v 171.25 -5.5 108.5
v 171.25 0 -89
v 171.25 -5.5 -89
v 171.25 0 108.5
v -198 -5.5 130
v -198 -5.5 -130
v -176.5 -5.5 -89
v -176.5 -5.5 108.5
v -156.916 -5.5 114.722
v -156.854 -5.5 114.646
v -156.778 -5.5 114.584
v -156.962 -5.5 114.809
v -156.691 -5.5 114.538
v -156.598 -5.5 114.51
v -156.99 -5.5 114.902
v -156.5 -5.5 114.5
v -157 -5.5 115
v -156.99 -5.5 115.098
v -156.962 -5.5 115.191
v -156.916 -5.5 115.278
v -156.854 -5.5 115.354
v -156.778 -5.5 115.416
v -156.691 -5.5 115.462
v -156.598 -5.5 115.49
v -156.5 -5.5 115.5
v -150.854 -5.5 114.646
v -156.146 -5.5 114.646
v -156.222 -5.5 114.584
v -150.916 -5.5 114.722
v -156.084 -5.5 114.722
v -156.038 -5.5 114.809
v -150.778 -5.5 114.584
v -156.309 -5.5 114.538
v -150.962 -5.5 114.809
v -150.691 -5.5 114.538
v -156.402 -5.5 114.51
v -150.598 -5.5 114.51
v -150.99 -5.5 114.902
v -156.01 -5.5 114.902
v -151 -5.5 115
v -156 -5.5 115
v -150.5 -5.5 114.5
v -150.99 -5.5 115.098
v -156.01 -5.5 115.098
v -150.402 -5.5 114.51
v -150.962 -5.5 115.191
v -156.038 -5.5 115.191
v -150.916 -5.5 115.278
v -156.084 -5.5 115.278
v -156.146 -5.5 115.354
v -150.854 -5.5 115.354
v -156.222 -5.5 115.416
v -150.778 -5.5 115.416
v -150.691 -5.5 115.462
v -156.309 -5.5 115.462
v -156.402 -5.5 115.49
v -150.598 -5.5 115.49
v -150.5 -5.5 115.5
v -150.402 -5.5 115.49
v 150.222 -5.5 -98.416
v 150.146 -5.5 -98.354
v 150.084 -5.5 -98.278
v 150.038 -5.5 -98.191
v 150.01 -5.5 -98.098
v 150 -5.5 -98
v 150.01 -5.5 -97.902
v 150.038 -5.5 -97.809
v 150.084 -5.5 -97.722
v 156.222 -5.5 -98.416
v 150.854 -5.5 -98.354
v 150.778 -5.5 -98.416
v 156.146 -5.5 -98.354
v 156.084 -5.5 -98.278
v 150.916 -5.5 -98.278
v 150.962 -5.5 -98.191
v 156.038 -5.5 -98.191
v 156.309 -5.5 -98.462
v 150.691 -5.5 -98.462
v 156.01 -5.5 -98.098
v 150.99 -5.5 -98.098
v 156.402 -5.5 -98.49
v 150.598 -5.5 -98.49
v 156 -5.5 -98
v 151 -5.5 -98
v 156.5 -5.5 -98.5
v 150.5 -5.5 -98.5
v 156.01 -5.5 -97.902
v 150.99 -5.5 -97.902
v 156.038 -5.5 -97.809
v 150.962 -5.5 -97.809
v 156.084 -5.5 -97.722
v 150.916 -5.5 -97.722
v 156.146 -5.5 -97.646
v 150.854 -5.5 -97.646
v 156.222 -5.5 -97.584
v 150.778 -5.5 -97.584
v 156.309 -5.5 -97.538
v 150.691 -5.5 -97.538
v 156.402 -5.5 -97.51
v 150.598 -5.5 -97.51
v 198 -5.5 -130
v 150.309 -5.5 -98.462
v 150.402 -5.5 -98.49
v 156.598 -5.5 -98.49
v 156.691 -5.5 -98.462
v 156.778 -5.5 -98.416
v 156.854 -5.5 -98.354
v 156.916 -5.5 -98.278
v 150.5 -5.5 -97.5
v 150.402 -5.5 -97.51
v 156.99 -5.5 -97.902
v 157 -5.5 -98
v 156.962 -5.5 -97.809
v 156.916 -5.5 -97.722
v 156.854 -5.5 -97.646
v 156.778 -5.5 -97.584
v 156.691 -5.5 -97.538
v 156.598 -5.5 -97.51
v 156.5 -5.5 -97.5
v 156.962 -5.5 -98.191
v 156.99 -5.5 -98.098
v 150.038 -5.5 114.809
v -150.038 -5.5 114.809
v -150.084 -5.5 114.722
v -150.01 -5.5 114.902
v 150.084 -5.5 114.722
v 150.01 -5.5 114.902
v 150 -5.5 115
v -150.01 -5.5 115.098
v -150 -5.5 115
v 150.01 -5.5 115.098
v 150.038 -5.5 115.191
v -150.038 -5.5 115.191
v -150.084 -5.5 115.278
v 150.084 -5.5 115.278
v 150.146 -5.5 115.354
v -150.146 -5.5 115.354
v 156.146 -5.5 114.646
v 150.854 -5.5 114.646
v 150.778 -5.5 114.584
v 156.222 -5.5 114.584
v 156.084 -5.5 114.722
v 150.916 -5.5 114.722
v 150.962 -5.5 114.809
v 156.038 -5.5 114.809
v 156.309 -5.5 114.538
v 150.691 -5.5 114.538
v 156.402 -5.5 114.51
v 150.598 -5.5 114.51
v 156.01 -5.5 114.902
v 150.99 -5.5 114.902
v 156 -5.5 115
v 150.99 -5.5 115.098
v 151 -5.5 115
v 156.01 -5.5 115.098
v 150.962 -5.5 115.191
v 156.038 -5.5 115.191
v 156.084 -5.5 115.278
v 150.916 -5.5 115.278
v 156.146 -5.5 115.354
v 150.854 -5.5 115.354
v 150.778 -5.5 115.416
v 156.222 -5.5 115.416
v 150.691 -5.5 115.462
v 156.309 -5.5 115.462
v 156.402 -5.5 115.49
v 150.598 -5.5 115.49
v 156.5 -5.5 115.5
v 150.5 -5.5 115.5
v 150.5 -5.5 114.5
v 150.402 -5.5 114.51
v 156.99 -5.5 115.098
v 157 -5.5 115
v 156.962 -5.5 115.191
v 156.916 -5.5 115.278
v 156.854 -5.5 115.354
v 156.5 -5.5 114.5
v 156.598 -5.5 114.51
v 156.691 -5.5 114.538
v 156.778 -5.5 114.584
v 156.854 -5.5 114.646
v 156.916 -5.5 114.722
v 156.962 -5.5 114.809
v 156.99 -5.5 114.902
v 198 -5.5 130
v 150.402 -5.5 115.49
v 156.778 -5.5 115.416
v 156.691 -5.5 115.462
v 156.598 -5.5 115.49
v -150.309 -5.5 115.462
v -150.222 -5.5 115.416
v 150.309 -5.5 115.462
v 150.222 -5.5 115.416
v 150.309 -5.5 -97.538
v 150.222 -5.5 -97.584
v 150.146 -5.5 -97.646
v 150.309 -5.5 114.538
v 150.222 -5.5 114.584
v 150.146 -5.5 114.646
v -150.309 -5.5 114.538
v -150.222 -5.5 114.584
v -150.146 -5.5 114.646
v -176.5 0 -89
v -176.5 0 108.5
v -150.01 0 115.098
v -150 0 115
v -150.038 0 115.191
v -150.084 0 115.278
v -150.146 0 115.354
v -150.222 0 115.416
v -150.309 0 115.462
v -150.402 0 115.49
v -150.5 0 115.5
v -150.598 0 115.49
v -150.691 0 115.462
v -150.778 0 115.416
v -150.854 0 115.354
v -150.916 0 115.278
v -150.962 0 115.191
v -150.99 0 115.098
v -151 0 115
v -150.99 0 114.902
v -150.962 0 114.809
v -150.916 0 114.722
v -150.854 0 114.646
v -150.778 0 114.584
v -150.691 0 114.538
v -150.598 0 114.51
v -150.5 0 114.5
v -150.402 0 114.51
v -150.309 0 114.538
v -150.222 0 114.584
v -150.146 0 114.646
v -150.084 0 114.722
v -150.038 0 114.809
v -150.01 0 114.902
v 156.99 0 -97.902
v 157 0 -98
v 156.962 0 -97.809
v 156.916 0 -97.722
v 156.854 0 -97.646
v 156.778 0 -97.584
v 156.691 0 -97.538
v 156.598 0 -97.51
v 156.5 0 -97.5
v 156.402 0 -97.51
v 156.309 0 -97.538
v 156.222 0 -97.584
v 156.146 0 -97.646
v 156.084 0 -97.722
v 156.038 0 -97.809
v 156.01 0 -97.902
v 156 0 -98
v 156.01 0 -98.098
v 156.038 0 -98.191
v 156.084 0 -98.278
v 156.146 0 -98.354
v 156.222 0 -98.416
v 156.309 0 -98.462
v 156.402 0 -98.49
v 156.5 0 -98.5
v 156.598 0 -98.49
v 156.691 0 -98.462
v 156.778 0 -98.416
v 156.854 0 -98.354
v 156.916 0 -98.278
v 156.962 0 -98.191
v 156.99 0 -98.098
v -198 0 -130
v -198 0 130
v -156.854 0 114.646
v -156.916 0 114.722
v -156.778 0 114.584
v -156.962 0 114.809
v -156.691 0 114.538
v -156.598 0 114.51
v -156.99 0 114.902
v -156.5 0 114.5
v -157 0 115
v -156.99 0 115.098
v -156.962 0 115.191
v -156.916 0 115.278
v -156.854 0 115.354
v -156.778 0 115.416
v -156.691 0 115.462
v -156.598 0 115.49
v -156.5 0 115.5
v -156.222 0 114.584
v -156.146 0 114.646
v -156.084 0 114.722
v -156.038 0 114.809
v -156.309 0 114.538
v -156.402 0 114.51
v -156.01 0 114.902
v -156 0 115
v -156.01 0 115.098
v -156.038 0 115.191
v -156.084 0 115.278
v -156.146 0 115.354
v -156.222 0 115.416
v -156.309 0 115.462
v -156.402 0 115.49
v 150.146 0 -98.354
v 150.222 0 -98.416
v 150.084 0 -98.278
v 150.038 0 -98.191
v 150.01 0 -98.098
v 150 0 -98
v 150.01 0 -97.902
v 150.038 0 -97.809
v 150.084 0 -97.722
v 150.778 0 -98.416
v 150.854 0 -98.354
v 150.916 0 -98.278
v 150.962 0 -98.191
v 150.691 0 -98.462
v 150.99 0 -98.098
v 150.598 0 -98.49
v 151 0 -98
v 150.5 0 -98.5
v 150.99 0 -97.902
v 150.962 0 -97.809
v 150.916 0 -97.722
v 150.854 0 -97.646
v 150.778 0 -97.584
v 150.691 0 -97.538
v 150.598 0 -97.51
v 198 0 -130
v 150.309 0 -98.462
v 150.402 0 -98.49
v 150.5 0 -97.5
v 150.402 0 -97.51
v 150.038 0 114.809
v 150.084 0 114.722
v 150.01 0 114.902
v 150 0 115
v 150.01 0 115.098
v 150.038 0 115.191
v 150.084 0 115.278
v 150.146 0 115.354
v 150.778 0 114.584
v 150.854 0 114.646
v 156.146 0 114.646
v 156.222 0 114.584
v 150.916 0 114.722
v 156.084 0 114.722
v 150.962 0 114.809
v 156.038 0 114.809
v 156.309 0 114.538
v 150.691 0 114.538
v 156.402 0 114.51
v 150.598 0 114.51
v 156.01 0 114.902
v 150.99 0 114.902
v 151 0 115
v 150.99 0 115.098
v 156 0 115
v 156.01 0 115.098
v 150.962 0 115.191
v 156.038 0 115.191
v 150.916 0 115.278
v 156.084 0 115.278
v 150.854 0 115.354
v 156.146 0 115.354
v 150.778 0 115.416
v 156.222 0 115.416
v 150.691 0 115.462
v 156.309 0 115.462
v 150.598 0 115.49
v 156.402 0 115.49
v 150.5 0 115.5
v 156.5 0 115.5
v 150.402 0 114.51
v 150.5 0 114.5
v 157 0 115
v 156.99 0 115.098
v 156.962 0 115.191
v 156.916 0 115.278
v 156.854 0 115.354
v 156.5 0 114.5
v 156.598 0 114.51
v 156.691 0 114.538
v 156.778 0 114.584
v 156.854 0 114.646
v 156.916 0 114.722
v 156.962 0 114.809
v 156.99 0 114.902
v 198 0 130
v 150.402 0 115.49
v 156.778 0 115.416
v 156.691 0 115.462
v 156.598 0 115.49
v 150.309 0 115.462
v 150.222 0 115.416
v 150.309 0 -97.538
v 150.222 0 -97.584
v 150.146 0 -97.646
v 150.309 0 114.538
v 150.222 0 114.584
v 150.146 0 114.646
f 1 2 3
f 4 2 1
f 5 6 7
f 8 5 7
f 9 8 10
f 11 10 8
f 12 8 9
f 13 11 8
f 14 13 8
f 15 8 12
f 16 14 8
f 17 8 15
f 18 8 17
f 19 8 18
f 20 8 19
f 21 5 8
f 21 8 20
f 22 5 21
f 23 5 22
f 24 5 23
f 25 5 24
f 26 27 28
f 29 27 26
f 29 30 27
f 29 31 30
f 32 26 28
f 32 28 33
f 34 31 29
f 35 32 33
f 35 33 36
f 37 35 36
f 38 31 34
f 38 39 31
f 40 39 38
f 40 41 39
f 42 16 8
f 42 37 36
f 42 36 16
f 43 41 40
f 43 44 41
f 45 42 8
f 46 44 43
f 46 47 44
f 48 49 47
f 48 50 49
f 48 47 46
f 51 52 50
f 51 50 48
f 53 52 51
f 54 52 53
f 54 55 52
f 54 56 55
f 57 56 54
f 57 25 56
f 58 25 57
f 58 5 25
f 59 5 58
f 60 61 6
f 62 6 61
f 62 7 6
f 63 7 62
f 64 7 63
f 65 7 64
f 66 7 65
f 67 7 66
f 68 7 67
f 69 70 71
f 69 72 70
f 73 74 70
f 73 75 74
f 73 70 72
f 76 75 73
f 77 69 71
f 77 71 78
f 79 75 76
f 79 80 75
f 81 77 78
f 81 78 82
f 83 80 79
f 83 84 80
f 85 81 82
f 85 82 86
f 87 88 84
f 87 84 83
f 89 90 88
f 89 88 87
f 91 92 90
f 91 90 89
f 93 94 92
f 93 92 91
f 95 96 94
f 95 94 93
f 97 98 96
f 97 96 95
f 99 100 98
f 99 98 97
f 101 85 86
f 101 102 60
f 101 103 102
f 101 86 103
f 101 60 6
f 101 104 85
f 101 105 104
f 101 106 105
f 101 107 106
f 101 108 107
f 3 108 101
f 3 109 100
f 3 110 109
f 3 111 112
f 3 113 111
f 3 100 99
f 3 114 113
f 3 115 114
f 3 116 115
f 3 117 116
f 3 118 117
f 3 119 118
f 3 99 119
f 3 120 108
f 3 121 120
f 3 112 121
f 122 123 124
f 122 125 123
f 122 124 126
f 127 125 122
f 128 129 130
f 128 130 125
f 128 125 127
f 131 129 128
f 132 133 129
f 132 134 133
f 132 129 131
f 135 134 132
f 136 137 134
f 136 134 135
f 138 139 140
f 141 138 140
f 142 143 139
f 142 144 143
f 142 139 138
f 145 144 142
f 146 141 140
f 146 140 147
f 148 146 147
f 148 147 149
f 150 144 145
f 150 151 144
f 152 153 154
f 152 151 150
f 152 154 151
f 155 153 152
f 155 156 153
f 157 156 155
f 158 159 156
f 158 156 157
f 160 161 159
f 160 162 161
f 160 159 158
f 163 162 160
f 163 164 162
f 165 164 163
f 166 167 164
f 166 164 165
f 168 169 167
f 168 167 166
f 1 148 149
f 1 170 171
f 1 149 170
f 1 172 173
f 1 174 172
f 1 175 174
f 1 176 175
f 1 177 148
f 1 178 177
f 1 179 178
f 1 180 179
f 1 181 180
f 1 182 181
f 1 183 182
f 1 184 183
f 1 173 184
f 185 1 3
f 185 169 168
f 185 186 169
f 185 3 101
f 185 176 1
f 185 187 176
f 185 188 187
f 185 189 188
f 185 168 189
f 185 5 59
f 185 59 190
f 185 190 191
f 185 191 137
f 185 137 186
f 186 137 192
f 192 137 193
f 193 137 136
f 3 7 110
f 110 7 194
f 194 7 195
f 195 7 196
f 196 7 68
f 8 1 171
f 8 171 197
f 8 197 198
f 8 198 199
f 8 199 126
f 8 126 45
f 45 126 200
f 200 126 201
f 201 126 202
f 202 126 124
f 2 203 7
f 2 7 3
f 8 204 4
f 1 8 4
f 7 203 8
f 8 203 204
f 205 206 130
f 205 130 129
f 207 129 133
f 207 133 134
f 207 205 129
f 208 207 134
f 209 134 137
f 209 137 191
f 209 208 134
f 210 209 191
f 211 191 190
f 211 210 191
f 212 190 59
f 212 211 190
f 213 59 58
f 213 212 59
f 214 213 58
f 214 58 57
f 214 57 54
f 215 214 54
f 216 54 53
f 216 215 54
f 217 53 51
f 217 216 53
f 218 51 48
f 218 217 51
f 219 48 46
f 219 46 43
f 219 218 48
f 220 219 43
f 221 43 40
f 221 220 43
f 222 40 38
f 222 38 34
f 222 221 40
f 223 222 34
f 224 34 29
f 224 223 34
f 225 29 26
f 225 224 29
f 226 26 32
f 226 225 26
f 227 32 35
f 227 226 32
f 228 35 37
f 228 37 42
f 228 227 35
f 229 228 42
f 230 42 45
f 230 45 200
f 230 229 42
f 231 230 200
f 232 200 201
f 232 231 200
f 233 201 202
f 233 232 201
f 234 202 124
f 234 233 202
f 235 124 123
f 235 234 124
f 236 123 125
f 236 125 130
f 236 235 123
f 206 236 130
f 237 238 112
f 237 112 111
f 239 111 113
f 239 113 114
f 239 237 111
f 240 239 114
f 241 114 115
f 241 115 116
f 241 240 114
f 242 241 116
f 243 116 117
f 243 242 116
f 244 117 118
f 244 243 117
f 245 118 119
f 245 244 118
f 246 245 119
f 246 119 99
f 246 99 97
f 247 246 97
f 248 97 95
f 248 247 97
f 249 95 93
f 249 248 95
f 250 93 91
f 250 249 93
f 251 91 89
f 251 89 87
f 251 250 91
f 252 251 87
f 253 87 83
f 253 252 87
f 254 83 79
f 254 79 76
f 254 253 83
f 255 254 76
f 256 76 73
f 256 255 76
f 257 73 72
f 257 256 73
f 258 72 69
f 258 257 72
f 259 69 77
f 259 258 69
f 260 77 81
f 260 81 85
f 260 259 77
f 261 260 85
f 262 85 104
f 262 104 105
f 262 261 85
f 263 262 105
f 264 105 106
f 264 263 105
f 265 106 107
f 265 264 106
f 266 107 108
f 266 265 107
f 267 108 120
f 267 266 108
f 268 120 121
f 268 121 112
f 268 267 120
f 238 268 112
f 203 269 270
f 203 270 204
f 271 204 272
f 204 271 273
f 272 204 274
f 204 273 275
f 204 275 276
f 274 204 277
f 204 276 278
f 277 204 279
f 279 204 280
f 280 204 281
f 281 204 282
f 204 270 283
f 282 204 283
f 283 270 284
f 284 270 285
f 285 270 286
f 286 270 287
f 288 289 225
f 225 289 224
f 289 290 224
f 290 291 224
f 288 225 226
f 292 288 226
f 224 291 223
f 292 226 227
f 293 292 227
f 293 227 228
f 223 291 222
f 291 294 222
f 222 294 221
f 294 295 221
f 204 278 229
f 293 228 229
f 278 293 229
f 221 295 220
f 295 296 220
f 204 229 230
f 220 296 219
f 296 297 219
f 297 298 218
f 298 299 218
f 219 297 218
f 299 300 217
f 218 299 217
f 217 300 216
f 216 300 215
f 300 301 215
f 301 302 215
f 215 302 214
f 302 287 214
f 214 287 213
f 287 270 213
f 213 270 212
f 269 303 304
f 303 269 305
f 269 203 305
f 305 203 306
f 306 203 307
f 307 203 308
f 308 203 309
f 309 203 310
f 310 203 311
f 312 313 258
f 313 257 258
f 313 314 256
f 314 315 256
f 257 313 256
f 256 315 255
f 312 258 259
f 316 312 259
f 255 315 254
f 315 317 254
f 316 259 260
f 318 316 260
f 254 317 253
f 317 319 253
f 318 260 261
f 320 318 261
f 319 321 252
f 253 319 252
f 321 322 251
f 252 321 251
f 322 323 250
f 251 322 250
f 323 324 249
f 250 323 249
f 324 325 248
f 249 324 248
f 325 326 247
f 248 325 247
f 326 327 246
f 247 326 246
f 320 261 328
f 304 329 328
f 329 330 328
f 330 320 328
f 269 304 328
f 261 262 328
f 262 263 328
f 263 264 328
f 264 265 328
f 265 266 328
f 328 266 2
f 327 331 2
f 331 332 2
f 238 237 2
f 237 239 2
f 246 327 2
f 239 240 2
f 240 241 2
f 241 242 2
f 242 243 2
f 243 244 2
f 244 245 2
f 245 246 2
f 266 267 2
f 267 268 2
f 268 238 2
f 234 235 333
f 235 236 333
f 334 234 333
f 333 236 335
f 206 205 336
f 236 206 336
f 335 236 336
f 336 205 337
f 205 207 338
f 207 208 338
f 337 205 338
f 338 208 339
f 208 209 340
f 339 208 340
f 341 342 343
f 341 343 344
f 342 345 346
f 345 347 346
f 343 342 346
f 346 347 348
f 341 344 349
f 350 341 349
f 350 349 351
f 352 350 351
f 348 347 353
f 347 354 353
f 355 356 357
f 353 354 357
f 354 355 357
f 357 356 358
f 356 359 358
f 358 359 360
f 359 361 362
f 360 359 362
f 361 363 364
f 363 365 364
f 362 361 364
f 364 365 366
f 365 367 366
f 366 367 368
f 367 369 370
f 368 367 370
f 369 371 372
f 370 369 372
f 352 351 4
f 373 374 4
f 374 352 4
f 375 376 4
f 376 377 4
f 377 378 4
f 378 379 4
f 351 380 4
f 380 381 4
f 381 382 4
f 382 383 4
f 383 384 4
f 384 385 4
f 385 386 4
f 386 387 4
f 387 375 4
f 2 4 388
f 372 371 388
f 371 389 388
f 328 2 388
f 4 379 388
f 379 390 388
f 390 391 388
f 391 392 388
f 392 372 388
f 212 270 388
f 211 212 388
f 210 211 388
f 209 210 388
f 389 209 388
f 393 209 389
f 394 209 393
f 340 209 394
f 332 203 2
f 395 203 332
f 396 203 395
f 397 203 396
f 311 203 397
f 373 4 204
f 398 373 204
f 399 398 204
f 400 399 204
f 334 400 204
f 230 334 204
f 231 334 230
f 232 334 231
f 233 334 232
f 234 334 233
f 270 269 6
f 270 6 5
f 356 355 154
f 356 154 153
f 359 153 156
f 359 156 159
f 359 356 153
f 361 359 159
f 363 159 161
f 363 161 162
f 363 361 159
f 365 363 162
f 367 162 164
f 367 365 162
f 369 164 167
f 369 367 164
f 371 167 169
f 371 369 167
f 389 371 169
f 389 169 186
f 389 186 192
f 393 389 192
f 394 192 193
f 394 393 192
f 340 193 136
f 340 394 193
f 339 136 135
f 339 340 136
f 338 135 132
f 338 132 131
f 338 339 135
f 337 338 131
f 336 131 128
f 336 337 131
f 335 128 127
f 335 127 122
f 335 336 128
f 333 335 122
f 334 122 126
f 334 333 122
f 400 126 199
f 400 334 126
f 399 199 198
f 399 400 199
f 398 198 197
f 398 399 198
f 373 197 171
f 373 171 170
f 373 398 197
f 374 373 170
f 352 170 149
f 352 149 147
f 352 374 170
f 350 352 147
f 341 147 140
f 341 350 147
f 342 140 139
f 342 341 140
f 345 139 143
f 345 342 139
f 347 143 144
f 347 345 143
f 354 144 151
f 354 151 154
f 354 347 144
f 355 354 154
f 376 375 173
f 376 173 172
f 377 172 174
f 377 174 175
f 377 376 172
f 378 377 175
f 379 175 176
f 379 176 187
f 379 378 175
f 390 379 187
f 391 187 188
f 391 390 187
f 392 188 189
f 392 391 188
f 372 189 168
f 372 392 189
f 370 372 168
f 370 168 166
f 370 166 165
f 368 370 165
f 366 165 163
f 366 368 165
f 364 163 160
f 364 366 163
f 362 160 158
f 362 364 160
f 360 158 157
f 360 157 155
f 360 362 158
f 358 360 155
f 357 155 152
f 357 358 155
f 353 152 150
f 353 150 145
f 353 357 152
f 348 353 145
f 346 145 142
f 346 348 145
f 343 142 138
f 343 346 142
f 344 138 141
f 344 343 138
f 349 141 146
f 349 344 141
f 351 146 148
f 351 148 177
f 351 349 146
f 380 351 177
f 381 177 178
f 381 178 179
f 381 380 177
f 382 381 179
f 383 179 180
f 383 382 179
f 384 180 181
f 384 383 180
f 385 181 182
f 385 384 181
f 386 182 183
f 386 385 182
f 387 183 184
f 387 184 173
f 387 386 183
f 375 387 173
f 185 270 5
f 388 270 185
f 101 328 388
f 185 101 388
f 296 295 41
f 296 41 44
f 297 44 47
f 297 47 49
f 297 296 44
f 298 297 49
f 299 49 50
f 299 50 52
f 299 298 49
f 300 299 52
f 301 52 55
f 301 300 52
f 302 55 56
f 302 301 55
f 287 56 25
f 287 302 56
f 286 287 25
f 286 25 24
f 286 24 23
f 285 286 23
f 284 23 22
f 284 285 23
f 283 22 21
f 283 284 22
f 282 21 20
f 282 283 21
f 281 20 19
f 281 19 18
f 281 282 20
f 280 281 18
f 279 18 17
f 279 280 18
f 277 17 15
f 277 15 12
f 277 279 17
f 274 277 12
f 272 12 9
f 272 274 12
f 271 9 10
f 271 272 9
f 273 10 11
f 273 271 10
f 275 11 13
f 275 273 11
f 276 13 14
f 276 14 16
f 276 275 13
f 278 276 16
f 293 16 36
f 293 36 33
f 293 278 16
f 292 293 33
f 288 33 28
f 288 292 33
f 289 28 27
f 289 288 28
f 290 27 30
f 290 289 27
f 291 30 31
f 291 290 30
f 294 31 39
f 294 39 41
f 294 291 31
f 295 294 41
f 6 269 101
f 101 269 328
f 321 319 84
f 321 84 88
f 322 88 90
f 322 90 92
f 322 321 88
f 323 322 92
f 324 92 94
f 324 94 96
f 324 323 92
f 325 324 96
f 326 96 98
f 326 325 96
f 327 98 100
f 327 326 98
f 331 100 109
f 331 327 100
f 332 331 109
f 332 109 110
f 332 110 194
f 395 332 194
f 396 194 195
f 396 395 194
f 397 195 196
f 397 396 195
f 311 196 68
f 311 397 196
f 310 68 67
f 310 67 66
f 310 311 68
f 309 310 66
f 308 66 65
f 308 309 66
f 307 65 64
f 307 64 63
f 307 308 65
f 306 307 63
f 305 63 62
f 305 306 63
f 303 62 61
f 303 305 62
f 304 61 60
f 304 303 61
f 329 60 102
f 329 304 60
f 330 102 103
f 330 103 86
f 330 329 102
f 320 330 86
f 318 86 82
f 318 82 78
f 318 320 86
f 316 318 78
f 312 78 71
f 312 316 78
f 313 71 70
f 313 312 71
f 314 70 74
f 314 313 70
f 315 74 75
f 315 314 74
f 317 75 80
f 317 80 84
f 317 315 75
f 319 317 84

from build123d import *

# Parameters (mm, degrees)
F0_W     = 396
F0_H     = 260
F0_R     = 0.5
F0_W_2   = 347.75
F0_H_2   = 197.5
F1_DEPTH = 5.5


with BuildPart() as f1:
    # F0 (on Front) → F1 (new body)
    with BuildSketch(Plane.XZ):
        Rectangle(F0_W, F0_H)
        with Locations((150.5, -98)):
            Circle(F0_R, mode=Mode.SUBTRACT)
        with Locations((156.5, -98)):
            Circle(F0_R, mode=Mode.SUBTRACT)
        with Locations((-2.625, 9.75)):
            Rectangle(F0_W_2, F0_H_2, mode=Mode.SUBTRACT)
        with Locations((-156.5, 115)):
            Circle(F0_R, mode=Mode.SUBTRACT)
        with Locations((-150.5, 115)):
            Circle(F0_R, mode=Mode.SUBTRACT)
        with Locations((150.5, 115)):
            Circle(F0_R, mode=Mode.SUBTRACT)
        with Locations((156.5, 115)):
            Circle(F0_R, mode=Mode.SUBTRACT)
    extrude(amount=F1_DEPTH)


solid = f1.part
